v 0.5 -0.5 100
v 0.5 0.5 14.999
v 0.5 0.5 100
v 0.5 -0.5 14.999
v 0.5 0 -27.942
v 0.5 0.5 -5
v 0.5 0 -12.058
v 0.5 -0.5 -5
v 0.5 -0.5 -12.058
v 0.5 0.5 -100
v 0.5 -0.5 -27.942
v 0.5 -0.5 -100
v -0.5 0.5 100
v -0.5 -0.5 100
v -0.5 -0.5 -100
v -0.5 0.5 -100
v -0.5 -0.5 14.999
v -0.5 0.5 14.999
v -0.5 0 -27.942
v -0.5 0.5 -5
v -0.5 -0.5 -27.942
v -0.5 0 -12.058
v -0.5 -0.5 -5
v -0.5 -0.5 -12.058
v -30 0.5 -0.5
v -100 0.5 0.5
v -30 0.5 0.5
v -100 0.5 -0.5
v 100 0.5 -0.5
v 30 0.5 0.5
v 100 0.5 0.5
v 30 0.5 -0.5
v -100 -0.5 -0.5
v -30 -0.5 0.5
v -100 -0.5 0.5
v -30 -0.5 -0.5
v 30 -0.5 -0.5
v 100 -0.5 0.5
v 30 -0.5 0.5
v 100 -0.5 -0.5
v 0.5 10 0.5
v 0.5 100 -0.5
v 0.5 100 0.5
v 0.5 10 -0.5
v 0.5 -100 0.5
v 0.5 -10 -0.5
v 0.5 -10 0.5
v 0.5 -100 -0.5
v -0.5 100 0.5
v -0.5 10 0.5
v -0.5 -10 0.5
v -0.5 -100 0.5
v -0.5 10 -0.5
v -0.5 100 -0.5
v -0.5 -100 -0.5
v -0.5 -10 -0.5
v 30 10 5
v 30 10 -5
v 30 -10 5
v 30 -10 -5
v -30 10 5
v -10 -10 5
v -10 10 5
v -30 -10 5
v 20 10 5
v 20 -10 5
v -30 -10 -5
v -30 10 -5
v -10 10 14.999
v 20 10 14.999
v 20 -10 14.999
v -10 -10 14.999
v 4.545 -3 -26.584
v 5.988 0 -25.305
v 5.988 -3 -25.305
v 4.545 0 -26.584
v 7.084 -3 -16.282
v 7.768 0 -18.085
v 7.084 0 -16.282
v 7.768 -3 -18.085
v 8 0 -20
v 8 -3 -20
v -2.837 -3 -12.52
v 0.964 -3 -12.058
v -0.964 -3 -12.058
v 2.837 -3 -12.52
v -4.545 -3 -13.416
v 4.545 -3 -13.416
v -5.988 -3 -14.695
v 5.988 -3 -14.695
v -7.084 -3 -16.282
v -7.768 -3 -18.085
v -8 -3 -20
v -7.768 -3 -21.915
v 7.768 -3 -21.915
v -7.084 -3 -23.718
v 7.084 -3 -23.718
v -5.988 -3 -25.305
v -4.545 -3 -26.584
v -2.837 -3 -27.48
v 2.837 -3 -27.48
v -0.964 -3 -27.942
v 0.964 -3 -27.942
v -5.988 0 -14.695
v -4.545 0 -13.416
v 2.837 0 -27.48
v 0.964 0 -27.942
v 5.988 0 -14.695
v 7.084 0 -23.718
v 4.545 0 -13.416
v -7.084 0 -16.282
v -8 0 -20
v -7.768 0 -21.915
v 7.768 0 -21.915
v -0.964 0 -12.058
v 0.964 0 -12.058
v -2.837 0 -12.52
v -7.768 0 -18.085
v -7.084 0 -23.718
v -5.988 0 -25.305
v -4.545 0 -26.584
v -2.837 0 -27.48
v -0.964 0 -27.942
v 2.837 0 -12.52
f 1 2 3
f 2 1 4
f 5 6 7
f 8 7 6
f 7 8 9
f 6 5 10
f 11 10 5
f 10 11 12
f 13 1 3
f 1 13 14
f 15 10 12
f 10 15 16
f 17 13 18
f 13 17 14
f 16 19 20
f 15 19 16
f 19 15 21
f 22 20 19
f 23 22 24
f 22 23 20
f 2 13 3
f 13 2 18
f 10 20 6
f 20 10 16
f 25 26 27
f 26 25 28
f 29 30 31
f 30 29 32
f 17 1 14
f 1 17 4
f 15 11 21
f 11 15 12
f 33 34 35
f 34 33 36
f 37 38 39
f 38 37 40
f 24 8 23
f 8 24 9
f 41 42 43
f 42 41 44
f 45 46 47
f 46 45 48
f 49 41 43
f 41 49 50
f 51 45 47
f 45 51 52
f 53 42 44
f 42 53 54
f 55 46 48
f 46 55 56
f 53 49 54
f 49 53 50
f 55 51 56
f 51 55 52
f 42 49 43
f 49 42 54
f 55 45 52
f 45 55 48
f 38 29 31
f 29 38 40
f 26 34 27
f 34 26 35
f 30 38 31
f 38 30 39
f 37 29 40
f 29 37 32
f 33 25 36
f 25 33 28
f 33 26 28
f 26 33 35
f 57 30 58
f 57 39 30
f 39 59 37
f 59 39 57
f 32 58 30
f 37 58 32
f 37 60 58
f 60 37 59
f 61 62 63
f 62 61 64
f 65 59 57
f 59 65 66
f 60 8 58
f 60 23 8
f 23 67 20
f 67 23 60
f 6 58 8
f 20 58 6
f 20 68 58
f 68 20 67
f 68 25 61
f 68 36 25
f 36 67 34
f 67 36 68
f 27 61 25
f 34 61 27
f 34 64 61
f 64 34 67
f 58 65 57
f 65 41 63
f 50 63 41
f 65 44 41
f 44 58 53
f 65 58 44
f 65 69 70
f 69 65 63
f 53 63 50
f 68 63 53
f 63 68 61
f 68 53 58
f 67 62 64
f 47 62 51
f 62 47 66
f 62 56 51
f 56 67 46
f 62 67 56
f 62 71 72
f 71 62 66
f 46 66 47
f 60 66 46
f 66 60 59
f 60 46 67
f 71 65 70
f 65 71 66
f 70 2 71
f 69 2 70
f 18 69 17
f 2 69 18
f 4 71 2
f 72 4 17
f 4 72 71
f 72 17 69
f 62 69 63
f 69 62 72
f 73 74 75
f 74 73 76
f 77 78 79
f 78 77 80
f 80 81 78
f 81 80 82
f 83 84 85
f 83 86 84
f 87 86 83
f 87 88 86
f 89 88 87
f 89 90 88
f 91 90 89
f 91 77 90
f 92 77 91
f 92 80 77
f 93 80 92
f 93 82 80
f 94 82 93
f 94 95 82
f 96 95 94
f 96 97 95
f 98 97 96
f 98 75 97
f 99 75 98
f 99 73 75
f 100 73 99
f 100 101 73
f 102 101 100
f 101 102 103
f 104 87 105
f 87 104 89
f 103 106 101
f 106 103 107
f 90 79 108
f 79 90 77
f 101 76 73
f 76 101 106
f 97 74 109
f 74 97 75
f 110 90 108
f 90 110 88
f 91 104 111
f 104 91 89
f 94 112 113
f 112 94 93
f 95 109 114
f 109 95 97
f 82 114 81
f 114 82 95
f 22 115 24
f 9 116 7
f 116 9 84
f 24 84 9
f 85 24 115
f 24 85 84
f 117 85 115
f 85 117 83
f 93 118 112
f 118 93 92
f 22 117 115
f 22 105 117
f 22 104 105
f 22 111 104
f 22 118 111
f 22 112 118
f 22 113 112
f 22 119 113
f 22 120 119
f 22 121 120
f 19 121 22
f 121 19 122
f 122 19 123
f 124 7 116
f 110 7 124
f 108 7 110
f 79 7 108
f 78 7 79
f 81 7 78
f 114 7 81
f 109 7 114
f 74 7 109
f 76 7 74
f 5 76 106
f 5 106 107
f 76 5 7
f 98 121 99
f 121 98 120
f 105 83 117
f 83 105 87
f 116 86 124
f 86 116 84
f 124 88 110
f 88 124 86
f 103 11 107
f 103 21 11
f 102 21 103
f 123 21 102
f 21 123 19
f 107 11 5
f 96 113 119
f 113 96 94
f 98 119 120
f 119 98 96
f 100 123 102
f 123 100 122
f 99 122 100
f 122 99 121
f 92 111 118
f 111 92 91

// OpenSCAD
// axis
cube([1,1,200],center=true);
cube([1,200,1],center=true);
cube([200,1,1],center=true);

cube([60,20,10],center=true);

translate([5,0,10 - 0.001])
    cube([30,20,10],center=true);

rotate([90,0,0])
    translate([0,-20,0])
    cylinder(h=3,r=8);
